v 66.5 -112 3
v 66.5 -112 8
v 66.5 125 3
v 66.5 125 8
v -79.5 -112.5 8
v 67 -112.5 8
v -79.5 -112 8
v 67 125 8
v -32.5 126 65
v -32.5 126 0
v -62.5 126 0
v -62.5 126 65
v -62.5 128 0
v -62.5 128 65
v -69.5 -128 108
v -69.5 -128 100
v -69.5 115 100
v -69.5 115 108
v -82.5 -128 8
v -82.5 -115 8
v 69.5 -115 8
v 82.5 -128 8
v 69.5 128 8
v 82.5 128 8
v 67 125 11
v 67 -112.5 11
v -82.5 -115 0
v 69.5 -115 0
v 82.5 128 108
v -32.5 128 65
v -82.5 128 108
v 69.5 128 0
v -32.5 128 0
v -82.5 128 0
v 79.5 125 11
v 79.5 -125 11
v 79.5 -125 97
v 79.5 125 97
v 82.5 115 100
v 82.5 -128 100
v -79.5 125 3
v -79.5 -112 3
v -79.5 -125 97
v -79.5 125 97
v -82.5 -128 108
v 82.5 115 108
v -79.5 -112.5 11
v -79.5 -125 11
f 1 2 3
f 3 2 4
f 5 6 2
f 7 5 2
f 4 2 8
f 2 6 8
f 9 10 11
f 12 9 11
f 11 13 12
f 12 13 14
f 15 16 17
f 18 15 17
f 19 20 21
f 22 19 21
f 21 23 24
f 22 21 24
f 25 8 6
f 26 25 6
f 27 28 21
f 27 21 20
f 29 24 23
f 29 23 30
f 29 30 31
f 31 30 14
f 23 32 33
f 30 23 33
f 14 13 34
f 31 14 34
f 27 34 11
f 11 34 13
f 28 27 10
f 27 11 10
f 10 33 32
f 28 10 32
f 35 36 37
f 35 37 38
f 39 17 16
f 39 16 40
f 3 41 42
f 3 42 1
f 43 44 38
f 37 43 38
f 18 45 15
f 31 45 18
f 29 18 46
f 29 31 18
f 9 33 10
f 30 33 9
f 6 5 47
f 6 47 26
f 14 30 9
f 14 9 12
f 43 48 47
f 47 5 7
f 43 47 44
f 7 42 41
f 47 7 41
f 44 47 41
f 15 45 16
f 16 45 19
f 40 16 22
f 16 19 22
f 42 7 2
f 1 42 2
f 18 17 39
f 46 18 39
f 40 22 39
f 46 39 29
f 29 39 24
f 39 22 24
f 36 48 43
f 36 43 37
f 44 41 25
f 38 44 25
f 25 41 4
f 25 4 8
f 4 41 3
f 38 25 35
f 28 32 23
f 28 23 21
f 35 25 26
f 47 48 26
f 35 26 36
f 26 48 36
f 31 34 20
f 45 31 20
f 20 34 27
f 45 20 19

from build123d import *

# Parameters (mm, degrees)
F0_W      = 165
F0_H      = 256
F0_W_2    = 159
F0_H_2    = 250
F1_DEPTH  = 100
F2_W      = 165
F2_H      = 256
F3_DEPTH  = 3
F4_W      = 165
F4_H      = 256
F5_DEPTH  = 3
F7_DEPTH  = 8
F9_DEPTH  = 8
F10_W     = 30
F10_H     = 65
F11_DEPTH = 2
F12_W     = 243
F12_H     = 8
F13_DEPTH = 3
F14_W     = 152
F14_H     = 8
F15_DEPTH = 3
F16_W     = 165
F16_H     = 15.5
F17_DEPTH = 3
F18_W     = 15.5
F18_H     = 240.5
F19_DEPTH = 3


with BuildPart() as f1:
    # F0 (on Top) → F1 (new body)
    with BuildSketch(Plane.XY):
        Rectangle(F0_W, F0_H)
        Rectangle(F0_W_2, F0_H_2, mode=Mode.SUBTRACT)
    extrude(amount=F1_DEPTH)

    # F2 (on face) → F3 (join)
    with BuildSketch(Plane.XY):
        Rectangle(F2_W, F2_H)
    extrude(amount=F3_DEPTH)

    # F4 (on face) → F5 (join)
    with BuildSketch(Plane.XY.offset(100)):
        Rectangle(F4_W, F4_H)
    extrude(amount=-F5_DEPTH)

    # F6 (on face) → F7 (join)
    with BuildSketch(Plane.XY.offset(100)):
        Polygon((-82.5, 128), (-82.5, -128), (-69.5, -128), (-69.5, 115), (82.5, 115), (82.5, 128), (-69.5, 128), (-73.5, 128), align=None)
    extrude(amount=F7_DEPTH)

    # F8 (on Top) → F9 (cut)
    with BuildSketch(Plane.XY):
        Polygon((-82.5, -128), (82.5, -128), (82.5, -115), (82.5, 128), (69.5, 128), (69.5, -115), (-82.5, -115), align=None)
    extrude(amount=F9_DEPTH, mode=Mode.SUBTRACT)

    # F10 (on face) → F11 (cut)
    with BuildSketch(Plane(origin=(0, 128, 0), x_dir=(-1, 0, 0), z_dir=(0, 1, 0))):
        with Locations((47.5, 32.5)):
            Rectangle(F10_W, F10_H)
    extrude(amount=-F11_DEPTH, mode=Mode.SUBTRACT)

    # F12 (on face) → F13 (join)
    with BuildSketch(Plane.YZ.offset(69.5)):
        with Locations((6.5, 4)):
            Rectangle(F12_W, F12_H)
    extrude(amount=-F13_DEPTH)

    # F14 (on face) → F15 (join)
    with BuildSketch(Plane.XZ.offset(115)):
        with Locations((-6.5, 4)):
            Rectangle(F14_W, F14_H)
    extrude(amount=-F15_DEPTH)

    # F16 (on face) → F17 (join)
    with BuildSketch(Plane(origin=(0, 0, 8), x_dir=(1, 0, 0), z_dir=(0, 0, -1))):
        with Locations((0, 120.25)):
            Rectangle(F16_W, F16_H)
    extrude(amount=-F17_DEPTH)

    # F18 (on face) → F19 (join)
    with BuildSketch(Plane(origin=(0, 0, 8), x_dir=(1, 0, 0), z_dir=(0, 0, -1))):
        with Locations((74.75, -7.75)):
            Rectangle(F18_W, F18_H)
    extrude(amount=-F19_DEPTH)


solid = f1.part
